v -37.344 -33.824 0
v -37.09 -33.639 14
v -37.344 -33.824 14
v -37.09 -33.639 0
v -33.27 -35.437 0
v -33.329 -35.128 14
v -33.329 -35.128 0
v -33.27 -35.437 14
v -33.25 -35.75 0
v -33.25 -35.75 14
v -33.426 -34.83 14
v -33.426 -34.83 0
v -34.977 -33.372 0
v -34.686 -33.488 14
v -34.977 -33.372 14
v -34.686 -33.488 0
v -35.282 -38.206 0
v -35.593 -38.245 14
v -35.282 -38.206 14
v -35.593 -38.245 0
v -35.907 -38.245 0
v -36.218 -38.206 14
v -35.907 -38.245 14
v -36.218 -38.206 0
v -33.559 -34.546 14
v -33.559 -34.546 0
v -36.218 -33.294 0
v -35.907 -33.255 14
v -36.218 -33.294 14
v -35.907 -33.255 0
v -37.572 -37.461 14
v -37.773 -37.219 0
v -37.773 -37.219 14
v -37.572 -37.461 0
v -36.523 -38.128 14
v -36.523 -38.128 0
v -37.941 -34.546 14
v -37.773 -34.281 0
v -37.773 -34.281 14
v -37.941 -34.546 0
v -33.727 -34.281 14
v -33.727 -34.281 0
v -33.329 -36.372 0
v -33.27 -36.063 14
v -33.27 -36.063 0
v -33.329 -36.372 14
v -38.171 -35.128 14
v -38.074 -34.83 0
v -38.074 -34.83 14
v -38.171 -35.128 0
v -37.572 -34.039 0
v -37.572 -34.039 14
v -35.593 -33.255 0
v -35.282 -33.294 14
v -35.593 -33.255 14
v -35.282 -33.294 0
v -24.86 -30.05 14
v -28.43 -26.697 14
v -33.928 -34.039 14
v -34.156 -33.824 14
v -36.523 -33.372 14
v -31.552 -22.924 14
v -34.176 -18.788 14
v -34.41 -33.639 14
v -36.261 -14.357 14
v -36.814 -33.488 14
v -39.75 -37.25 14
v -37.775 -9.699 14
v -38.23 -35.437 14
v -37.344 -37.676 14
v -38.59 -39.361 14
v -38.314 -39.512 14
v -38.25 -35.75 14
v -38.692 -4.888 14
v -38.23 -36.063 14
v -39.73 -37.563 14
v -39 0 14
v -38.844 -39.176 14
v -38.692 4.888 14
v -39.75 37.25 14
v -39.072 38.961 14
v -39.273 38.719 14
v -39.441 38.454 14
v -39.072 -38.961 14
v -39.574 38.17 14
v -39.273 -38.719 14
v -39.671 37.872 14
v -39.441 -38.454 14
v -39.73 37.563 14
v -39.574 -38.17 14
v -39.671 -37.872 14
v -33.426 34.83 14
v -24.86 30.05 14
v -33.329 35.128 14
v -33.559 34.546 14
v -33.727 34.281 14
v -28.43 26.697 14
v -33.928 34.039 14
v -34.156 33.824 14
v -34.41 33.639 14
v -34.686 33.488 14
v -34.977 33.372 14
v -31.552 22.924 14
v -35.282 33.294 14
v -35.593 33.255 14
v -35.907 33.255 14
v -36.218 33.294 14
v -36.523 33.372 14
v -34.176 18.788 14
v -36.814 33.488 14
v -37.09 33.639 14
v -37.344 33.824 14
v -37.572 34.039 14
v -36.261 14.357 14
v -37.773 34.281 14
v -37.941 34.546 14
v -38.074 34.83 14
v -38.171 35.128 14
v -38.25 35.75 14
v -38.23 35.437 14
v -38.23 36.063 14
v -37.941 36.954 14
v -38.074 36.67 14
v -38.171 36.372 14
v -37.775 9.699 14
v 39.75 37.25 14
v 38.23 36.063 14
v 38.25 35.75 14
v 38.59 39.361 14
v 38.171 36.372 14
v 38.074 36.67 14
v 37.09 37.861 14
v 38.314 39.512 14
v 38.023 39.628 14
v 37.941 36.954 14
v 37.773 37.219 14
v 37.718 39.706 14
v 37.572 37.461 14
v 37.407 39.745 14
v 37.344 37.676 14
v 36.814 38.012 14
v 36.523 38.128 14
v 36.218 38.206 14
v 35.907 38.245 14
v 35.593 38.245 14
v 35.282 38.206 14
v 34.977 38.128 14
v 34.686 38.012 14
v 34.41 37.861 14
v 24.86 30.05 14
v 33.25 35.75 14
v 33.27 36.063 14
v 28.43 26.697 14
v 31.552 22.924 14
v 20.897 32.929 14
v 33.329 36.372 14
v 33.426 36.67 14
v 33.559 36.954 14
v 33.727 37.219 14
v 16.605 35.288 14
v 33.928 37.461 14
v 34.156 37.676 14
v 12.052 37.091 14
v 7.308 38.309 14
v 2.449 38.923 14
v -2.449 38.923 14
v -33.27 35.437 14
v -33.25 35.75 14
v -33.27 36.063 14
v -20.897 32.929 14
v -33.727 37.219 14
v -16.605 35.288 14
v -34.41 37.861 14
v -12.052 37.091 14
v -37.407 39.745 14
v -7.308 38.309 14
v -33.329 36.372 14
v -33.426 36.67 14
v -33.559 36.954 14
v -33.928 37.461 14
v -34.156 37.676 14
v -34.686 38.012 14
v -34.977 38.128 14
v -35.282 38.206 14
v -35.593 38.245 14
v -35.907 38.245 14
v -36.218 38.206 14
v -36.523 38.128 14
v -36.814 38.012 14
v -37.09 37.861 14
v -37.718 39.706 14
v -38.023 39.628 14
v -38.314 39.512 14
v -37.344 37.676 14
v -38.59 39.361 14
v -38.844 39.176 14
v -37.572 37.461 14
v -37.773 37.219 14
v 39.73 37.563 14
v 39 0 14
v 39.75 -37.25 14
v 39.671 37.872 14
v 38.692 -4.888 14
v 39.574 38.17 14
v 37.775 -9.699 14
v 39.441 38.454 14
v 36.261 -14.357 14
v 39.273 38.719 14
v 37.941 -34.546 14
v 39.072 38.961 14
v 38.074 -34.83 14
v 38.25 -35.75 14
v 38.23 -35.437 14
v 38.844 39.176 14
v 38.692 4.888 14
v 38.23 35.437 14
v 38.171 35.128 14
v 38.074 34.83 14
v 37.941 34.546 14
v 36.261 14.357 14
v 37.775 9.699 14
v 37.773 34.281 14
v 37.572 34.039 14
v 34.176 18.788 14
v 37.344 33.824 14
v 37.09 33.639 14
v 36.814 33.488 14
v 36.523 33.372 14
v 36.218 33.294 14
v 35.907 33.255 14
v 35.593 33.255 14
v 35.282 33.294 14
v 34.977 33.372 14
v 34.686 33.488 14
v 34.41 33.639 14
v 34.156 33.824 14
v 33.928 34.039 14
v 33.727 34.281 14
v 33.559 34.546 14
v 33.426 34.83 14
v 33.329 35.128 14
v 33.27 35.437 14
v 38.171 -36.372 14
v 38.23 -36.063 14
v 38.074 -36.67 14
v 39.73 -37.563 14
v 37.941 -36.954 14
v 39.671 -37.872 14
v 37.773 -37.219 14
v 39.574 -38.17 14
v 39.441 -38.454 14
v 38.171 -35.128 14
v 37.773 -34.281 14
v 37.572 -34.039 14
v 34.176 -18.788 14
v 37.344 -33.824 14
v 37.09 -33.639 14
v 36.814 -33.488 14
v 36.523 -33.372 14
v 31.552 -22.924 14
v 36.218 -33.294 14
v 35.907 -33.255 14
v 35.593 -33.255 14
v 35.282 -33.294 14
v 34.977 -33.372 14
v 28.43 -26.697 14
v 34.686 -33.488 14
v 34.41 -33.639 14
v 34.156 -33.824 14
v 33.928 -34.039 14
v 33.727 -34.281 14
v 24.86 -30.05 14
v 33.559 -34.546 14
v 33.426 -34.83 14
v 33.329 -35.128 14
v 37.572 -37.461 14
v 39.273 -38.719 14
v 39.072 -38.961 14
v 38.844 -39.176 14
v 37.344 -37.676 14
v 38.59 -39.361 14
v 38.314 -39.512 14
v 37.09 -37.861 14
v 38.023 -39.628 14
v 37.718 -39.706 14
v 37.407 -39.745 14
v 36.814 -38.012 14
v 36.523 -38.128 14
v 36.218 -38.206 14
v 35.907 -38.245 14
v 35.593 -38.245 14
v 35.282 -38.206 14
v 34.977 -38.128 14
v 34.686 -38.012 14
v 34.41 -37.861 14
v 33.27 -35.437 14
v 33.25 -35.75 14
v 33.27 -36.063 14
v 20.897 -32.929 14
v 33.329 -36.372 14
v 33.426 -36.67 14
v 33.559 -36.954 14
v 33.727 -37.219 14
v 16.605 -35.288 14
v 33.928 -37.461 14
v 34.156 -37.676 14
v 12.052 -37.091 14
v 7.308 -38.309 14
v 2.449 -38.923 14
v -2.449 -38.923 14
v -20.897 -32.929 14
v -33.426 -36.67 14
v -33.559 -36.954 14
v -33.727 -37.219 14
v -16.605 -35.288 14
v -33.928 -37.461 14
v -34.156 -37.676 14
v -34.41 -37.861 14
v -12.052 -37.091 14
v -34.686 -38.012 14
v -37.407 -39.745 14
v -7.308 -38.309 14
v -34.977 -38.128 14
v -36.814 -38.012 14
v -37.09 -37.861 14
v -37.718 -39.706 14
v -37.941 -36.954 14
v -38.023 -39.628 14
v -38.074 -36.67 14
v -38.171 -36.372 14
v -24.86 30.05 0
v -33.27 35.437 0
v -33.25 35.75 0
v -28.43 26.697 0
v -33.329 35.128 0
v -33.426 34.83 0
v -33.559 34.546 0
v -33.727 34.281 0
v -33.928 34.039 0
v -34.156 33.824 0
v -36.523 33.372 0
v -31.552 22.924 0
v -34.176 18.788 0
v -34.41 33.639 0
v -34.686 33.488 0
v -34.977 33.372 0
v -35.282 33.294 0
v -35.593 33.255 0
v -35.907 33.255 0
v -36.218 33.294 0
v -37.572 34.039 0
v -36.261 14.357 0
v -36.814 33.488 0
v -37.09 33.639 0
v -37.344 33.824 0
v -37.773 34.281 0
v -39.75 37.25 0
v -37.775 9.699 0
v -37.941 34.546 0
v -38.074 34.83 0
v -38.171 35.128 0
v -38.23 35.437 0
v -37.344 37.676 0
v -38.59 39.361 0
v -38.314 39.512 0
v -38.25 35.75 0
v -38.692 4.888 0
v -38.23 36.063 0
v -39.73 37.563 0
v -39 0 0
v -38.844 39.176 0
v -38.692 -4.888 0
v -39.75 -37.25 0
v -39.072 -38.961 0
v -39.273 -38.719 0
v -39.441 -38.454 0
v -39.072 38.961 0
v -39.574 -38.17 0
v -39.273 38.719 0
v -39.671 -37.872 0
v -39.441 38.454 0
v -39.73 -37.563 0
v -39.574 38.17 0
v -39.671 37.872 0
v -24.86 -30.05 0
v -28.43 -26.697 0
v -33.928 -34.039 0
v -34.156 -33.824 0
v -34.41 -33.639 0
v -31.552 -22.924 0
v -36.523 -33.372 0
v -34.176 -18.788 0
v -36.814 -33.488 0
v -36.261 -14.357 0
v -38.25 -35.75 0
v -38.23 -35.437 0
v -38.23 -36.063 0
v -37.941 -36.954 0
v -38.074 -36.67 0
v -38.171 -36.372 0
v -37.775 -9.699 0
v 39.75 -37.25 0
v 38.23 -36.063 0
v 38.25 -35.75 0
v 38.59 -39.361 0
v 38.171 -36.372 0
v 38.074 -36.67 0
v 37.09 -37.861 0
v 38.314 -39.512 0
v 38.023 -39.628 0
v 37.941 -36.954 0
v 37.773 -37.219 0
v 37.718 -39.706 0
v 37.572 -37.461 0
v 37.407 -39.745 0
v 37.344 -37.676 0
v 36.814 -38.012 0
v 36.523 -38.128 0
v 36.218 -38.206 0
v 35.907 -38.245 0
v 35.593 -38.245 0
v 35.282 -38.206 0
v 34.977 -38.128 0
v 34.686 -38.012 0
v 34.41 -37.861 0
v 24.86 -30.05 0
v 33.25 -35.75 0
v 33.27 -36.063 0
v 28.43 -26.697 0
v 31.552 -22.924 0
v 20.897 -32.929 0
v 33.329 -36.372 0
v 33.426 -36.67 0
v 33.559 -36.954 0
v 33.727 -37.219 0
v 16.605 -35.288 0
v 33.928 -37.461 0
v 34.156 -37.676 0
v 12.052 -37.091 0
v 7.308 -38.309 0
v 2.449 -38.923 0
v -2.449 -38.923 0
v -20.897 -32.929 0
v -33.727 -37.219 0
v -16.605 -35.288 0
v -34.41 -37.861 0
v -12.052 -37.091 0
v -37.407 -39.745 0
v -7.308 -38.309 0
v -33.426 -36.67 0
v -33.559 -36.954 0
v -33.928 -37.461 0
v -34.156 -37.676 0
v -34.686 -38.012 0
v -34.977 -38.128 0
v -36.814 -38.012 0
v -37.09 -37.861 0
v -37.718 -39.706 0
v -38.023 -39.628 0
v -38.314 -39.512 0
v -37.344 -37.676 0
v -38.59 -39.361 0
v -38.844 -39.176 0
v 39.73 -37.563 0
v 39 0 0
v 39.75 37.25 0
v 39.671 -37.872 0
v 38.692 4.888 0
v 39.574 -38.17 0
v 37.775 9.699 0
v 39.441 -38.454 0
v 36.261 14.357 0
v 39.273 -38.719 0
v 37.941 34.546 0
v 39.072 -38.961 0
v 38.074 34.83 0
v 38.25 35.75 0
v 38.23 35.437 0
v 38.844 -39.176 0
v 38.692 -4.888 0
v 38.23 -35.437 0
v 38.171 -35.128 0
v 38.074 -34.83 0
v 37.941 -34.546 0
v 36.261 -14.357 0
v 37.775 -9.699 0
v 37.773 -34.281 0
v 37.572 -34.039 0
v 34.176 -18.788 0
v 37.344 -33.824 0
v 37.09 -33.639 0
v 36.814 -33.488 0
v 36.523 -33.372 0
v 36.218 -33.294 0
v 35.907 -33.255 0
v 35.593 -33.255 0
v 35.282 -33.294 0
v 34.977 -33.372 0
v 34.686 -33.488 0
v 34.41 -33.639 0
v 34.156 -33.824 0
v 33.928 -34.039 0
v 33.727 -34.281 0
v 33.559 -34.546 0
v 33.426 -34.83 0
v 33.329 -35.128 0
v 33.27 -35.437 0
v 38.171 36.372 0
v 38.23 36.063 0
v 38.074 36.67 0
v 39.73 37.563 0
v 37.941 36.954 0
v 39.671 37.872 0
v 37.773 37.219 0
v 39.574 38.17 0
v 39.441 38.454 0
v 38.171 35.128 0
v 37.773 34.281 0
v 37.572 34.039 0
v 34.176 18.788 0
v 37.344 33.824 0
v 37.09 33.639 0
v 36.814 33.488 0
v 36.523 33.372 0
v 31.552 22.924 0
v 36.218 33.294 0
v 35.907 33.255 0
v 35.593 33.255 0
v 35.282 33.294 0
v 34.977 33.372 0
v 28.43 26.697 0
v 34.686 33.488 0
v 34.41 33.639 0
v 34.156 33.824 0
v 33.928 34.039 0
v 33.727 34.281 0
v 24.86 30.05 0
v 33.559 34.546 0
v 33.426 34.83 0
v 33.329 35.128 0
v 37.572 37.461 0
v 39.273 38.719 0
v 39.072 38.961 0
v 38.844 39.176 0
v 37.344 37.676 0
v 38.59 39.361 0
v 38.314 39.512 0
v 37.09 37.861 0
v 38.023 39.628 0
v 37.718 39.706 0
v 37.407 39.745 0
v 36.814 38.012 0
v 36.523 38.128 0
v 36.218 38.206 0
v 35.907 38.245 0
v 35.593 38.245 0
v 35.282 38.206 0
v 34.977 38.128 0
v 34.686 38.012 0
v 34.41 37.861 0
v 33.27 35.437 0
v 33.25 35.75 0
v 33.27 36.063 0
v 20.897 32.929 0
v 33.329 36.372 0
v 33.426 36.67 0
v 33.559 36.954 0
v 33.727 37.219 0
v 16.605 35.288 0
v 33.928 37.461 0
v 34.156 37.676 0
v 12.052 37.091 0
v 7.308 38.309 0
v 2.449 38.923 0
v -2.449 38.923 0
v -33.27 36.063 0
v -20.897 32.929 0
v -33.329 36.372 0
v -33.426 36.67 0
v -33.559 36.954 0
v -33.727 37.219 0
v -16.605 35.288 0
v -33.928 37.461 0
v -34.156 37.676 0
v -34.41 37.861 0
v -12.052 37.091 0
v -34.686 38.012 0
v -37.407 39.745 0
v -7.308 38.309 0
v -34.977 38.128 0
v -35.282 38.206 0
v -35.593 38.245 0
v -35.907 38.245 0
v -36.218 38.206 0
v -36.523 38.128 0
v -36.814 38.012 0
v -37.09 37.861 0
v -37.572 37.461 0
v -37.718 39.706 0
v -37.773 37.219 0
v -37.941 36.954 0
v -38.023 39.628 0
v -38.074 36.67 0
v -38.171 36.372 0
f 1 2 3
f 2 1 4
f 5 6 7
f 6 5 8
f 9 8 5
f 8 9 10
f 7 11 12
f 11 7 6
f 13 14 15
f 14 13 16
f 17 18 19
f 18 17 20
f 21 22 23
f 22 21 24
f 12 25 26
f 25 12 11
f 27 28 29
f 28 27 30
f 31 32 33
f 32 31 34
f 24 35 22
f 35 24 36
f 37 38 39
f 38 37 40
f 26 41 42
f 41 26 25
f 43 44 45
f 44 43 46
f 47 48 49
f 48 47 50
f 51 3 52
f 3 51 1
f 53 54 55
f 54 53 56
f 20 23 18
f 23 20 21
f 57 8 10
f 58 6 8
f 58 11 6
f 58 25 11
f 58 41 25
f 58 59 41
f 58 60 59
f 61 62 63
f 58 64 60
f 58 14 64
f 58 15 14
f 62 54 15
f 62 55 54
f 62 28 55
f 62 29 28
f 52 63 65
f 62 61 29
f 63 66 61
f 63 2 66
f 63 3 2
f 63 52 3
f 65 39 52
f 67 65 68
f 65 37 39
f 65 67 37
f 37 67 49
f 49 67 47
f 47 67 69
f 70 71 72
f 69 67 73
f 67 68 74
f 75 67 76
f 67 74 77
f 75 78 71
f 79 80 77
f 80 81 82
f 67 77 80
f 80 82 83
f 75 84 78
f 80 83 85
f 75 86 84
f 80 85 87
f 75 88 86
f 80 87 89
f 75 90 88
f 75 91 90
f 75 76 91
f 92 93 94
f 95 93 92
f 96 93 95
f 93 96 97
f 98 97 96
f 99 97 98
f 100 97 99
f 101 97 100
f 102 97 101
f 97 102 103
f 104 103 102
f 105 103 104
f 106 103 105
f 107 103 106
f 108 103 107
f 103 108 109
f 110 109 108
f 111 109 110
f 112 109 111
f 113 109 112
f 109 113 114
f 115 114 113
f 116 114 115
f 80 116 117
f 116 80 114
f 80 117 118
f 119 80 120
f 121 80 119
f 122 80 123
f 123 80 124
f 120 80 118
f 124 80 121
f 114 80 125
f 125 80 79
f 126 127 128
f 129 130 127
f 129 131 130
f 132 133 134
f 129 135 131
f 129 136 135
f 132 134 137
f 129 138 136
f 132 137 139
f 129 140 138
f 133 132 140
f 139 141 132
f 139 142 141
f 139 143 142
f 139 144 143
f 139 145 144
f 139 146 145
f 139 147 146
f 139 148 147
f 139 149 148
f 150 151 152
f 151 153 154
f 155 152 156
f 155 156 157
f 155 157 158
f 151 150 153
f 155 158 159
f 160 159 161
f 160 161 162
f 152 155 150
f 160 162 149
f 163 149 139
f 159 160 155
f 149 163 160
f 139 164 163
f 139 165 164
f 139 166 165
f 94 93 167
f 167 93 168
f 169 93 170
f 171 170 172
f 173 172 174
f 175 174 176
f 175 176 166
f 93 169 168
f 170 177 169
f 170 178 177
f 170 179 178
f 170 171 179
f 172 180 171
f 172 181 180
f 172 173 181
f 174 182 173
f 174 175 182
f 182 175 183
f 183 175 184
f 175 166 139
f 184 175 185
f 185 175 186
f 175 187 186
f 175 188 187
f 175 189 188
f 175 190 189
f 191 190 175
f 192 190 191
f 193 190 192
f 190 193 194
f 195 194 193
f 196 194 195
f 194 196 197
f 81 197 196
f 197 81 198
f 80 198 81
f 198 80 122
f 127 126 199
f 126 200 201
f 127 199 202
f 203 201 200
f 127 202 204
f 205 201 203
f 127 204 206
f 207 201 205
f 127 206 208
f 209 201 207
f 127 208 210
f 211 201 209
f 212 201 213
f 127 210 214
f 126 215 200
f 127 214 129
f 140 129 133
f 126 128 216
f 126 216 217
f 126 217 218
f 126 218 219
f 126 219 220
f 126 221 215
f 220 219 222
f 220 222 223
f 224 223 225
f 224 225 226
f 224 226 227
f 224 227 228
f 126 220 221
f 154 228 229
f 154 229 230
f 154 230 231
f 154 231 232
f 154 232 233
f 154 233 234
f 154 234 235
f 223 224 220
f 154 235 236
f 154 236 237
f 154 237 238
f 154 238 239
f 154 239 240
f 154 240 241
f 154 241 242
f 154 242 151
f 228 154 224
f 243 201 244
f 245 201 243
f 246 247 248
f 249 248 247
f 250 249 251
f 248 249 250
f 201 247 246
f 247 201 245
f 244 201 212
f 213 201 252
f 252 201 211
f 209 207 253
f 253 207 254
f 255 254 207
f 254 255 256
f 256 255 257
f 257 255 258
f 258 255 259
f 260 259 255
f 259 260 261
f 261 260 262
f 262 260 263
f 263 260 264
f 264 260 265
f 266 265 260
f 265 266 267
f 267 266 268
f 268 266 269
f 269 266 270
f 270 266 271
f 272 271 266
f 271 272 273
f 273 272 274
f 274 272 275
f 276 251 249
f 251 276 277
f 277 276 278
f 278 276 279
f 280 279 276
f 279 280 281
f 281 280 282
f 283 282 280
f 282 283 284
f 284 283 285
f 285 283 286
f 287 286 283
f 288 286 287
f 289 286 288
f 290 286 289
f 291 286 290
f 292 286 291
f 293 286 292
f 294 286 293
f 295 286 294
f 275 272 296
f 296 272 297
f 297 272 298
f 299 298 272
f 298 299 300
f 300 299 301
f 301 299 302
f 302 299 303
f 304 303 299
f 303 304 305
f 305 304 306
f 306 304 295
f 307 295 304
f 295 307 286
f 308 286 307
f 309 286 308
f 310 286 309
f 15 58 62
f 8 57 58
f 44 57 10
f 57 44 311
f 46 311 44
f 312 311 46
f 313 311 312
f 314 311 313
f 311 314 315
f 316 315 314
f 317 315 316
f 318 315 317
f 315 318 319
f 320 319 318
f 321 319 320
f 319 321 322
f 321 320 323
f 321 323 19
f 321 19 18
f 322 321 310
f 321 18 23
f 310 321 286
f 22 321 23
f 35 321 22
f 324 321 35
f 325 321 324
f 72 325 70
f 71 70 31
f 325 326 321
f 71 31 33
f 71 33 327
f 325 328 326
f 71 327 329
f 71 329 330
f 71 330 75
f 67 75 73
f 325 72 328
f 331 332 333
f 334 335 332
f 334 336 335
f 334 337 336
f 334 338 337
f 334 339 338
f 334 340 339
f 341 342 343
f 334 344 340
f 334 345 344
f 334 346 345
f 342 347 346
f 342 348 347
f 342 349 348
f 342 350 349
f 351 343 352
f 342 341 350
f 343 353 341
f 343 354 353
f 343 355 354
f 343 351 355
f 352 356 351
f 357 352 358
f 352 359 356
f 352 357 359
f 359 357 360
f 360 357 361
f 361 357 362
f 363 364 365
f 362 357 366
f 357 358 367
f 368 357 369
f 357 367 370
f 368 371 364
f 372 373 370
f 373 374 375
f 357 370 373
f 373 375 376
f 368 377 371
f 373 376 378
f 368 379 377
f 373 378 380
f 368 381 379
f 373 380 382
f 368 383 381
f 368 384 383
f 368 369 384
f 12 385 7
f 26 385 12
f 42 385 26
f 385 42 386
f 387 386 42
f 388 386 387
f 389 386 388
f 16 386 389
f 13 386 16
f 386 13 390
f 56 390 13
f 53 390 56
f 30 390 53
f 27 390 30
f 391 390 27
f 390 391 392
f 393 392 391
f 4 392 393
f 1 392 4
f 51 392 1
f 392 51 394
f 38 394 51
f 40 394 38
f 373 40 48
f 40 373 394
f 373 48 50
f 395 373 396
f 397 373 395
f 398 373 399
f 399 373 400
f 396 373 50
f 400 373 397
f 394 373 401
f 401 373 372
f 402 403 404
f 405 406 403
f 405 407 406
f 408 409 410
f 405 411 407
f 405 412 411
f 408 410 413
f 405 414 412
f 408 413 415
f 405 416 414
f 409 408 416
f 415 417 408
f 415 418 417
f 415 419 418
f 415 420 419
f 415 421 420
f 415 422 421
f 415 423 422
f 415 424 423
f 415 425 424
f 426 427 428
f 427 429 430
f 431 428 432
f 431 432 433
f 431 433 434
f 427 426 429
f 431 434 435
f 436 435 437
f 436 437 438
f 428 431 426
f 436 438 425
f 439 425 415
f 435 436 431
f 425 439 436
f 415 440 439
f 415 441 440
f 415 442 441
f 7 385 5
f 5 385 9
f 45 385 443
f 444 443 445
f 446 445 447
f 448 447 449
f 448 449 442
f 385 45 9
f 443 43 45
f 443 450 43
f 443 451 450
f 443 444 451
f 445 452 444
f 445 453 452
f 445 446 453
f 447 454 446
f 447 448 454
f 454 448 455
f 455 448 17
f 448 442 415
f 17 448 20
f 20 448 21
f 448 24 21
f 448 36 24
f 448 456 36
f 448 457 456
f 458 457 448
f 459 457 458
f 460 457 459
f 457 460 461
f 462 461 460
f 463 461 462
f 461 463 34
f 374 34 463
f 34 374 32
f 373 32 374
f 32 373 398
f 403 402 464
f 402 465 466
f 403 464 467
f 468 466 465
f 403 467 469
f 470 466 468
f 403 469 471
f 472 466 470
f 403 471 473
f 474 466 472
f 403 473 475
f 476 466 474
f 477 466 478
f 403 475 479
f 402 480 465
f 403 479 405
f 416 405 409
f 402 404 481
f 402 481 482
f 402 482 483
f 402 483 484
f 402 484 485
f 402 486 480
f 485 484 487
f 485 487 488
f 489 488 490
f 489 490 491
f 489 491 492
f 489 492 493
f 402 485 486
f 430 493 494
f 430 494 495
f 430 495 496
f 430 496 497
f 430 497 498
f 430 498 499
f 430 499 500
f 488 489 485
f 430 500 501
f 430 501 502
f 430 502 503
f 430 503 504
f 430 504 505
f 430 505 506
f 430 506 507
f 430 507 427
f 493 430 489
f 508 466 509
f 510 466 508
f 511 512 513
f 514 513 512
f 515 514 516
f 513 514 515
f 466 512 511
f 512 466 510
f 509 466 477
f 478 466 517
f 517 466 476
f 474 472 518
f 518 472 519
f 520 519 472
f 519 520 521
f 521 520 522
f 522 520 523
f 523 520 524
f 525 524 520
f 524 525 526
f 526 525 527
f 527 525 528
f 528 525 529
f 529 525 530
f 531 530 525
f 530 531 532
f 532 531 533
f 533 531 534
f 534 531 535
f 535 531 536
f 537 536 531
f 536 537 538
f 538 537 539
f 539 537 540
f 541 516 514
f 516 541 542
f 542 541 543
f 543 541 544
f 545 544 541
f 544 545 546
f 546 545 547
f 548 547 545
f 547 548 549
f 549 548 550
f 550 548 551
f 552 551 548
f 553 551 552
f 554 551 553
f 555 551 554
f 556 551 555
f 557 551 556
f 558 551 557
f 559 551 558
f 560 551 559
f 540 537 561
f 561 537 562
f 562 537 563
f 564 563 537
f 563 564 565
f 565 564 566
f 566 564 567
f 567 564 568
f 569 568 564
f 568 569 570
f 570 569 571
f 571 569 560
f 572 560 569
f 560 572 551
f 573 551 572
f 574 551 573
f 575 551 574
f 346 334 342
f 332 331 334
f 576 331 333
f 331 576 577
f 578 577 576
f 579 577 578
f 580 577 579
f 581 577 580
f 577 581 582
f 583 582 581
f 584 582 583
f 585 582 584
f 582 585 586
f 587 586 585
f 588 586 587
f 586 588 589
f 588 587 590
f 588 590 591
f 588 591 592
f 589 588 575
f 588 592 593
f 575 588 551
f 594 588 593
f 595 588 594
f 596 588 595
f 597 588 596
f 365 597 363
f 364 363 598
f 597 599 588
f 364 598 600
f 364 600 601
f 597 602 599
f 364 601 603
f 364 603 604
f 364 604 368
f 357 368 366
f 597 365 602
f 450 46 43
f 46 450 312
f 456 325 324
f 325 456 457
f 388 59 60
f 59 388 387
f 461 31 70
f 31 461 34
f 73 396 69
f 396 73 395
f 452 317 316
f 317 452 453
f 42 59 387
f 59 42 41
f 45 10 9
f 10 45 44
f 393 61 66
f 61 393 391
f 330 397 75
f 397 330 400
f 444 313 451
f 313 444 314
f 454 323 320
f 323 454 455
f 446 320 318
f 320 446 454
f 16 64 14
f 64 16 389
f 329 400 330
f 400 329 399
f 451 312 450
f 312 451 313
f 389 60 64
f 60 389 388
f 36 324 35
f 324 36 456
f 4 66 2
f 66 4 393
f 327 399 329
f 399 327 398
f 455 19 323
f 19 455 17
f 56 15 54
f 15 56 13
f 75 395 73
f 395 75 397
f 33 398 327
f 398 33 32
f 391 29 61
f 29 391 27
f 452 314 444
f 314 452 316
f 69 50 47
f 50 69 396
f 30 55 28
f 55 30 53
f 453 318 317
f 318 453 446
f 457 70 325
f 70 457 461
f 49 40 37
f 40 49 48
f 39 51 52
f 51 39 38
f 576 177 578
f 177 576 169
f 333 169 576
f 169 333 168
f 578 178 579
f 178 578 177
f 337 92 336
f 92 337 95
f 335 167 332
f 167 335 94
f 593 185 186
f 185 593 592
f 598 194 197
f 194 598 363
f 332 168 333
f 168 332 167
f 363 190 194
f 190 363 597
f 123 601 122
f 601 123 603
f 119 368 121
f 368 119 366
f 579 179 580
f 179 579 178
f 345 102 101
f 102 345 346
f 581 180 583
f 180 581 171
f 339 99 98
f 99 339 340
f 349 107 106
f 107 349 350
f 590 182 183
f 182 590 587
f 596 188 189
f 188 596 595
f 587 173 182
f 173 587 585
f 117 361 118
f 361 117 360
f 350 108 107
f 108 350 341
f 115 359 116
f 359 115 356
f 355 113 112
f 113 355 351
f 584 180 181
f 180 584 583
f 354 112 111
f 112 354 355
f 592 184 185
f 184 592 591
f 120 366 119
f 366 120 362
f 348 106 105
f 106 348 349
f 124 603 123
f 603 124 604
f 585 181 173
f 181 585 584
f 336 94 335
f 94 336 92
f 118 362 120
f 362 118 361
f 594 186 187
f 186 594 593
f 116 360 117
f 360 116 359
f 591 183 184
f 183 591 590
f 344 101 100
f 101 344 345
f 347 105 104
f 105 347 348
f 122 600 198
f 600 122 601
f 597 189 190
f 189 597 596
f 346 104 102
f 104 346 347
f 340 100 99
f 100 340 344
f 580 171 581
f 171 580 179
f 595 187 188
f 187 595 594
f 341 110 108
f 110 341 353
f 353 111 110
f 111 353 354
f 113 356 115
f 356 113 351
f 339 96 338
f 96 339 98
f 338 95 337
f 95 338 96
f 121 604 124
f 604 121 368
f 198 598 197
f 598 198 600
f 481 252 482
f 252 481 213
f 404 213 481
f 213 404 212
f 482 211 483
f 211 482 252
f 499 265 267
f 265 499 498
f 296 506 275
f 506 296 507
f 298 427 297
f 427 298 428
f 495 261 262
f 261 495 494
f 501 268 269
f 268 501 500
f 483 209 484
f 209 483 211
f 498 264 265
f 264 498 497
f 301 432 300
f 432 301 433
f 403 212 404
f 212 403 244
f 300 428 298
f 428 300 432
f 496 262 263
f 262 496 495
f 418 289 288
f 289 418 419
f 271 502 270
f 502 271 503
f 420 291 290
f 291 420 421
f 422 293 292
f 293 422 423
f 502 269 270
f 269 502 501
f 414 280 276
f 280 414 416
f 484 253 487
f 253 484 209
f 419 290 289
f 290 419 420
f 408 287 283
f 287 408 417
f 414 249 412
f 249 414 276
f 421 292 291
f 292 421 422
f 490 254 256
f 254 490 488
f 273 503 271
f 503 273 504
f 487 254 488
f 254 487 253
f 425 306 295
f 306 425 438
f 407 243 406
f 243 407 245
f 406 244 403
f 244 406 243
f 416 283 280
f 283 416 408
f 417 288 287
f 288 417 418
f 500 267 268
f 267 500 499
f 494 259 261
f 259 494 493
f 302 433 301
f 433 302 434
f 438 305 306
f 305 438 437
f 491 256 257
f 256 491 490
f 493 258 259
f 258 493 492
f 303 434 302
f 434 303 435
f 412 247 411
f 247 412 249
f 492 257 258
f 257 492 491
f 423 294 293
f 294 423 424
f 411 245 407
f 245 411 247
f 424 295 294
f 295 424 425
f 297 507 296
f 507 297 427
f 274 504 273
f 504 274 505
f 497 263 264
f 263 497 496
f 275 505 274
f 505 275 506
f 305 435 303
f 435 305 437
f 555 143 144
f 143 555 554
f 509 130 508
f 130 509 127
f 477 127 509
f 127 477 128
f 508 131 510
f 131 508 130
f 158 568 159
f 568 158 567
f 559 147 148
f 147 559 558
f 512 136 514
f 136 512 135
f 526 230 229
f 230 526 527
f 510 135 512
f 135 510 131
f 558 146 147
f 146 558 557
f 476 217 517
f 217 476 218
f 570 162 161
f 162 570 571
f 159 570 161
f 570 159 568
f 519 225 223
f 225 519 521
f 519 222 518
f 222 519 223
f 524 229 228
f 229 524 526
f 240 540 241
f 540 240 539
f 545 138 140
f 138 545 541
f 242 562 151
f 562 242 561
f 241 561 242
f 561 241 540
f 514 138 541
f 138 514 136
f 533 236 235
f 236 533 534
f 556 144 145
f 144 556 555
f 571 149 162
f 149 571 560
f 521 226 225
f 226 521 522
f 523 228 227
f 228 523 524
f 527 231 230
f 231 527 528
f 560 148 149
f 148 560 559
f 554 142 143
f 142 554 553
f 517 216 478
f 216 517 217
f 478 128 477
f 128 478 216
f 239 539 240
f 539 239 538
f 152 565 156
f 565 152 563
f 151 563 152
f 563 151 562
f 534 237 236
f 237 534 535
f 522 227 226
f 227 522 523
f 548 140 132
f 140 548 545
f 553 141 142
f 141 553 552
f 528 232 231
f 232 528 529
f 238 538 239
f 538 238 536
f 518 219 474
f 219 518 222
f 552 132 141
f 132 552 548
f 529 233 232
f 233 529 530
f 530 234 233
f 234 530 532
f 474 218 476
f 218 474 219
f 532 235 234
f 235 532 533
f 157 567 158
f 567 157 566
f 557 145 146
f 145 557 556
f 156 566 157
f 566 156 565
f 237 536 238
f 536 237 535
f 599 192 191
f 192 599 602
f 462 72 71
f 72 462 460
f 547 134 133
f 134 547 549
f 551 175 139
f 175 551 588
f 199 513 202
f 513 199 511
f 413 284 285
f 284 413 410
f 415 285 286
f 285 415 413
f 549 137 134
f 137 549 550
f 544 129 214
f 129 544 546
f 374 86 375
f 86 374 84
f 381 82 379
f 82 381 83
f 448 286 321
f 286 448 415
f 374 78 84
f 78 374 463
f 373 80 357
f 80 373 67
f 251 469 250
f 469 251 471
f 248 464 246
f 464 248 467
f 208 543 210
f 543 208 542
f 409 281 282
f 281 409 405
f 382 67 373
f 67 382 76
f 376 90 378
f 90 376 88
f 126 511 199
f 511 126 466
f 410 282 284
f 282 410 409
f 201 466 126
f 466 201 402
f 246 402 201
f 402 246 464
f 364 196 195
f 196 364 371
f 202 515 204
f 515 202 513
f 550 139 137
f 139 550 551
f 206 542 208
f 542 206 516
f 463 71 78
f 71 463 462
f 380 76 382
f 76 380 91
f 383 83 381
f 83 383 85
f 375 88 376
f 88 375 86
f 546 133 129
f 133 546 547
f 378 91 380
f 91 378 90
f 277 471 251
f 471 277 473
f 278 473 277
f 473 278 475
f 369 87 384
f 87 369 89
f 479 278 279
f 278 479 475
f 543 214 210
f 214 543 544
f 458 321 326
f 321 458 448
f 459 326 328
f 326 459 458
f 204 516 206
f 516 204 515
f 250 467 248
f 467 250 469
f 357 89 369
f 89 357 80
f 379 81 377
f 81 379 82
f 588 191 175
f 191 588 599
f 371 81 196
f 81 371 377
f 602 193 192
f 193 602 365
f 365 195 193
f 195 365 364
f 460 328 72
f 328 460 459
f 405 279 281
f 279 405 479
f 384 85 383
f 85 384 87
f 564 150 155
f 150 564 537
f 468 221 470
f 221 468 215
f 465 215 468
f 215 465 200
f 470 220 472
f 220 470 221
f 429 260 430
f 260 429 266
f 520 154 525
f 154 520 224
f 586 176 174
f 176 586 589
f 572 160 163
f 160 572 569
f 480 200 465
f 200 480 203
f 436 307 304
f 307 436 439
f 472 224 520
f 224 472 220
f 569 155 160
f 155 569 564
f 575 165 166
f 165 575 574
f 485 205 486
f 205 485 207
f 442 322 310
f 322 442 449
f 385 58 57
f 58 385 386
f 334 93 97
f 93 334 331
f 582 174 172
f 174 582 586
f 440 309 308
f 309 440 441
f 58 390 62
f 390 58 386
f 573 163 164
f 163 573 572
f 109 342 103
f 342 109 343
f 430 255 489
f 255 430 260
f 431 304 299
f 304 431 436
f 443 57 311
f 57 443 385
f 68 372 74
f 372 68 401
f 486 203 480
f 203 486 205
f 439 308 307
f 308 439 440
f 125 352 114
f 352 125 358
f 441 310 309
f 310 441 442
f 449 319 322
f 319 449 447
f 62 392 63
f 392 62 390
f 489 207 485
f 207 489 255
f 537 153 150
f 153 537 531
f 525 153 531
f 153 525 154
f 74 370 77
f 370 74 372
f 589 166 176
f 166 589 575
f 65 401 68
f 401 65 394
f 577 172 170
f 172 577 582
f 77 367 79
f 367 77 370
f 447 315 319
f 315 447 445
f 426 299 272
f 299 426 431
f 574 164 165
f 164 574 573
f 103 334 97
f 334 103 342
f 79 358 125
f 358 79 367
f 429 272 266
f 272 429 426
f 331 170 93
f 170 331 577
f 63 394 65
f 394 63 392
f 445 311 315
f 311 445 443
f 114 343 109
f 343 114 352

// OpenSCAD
FAN_WIDTH = 79.5;
FAN_HEIGHT = 14;
FAN_DIA = 78;
FAN_CORNER_DIA = 5;
FAN_MOUNT_DIA = 5;
FAN_MOUNT_SPACING = 71.5;

$fn = 50;

module mounting_holes(width, length, height, dia) {
    for(i = [-1, 1]) {
        for(j = [-1, 1]) {
            translate([i * width/2, j * length/2, 0])
            cylinder(d = dia, h = height);
        }
    }
}

module rounded_rect(width, length, height, corner_dia) {
    hull()
    mounting_holes(width - corner_dia, length - corner_dia, height, corner_dia);
}

difference() {
    rounded_rect(FAN_WIDTH, FAN_WIDTH, FAN_HEIGHT, FAN_CORNER_DIA);
    cylinder(d = FAN_DIA, h = FAN_HEIGHT);
    mounting_holes(FAN_MOUNT_SPACING, FAN_MOUNT_SPACING, FAN_HEIGHT, FAN_MOUNT_DIA);
}
